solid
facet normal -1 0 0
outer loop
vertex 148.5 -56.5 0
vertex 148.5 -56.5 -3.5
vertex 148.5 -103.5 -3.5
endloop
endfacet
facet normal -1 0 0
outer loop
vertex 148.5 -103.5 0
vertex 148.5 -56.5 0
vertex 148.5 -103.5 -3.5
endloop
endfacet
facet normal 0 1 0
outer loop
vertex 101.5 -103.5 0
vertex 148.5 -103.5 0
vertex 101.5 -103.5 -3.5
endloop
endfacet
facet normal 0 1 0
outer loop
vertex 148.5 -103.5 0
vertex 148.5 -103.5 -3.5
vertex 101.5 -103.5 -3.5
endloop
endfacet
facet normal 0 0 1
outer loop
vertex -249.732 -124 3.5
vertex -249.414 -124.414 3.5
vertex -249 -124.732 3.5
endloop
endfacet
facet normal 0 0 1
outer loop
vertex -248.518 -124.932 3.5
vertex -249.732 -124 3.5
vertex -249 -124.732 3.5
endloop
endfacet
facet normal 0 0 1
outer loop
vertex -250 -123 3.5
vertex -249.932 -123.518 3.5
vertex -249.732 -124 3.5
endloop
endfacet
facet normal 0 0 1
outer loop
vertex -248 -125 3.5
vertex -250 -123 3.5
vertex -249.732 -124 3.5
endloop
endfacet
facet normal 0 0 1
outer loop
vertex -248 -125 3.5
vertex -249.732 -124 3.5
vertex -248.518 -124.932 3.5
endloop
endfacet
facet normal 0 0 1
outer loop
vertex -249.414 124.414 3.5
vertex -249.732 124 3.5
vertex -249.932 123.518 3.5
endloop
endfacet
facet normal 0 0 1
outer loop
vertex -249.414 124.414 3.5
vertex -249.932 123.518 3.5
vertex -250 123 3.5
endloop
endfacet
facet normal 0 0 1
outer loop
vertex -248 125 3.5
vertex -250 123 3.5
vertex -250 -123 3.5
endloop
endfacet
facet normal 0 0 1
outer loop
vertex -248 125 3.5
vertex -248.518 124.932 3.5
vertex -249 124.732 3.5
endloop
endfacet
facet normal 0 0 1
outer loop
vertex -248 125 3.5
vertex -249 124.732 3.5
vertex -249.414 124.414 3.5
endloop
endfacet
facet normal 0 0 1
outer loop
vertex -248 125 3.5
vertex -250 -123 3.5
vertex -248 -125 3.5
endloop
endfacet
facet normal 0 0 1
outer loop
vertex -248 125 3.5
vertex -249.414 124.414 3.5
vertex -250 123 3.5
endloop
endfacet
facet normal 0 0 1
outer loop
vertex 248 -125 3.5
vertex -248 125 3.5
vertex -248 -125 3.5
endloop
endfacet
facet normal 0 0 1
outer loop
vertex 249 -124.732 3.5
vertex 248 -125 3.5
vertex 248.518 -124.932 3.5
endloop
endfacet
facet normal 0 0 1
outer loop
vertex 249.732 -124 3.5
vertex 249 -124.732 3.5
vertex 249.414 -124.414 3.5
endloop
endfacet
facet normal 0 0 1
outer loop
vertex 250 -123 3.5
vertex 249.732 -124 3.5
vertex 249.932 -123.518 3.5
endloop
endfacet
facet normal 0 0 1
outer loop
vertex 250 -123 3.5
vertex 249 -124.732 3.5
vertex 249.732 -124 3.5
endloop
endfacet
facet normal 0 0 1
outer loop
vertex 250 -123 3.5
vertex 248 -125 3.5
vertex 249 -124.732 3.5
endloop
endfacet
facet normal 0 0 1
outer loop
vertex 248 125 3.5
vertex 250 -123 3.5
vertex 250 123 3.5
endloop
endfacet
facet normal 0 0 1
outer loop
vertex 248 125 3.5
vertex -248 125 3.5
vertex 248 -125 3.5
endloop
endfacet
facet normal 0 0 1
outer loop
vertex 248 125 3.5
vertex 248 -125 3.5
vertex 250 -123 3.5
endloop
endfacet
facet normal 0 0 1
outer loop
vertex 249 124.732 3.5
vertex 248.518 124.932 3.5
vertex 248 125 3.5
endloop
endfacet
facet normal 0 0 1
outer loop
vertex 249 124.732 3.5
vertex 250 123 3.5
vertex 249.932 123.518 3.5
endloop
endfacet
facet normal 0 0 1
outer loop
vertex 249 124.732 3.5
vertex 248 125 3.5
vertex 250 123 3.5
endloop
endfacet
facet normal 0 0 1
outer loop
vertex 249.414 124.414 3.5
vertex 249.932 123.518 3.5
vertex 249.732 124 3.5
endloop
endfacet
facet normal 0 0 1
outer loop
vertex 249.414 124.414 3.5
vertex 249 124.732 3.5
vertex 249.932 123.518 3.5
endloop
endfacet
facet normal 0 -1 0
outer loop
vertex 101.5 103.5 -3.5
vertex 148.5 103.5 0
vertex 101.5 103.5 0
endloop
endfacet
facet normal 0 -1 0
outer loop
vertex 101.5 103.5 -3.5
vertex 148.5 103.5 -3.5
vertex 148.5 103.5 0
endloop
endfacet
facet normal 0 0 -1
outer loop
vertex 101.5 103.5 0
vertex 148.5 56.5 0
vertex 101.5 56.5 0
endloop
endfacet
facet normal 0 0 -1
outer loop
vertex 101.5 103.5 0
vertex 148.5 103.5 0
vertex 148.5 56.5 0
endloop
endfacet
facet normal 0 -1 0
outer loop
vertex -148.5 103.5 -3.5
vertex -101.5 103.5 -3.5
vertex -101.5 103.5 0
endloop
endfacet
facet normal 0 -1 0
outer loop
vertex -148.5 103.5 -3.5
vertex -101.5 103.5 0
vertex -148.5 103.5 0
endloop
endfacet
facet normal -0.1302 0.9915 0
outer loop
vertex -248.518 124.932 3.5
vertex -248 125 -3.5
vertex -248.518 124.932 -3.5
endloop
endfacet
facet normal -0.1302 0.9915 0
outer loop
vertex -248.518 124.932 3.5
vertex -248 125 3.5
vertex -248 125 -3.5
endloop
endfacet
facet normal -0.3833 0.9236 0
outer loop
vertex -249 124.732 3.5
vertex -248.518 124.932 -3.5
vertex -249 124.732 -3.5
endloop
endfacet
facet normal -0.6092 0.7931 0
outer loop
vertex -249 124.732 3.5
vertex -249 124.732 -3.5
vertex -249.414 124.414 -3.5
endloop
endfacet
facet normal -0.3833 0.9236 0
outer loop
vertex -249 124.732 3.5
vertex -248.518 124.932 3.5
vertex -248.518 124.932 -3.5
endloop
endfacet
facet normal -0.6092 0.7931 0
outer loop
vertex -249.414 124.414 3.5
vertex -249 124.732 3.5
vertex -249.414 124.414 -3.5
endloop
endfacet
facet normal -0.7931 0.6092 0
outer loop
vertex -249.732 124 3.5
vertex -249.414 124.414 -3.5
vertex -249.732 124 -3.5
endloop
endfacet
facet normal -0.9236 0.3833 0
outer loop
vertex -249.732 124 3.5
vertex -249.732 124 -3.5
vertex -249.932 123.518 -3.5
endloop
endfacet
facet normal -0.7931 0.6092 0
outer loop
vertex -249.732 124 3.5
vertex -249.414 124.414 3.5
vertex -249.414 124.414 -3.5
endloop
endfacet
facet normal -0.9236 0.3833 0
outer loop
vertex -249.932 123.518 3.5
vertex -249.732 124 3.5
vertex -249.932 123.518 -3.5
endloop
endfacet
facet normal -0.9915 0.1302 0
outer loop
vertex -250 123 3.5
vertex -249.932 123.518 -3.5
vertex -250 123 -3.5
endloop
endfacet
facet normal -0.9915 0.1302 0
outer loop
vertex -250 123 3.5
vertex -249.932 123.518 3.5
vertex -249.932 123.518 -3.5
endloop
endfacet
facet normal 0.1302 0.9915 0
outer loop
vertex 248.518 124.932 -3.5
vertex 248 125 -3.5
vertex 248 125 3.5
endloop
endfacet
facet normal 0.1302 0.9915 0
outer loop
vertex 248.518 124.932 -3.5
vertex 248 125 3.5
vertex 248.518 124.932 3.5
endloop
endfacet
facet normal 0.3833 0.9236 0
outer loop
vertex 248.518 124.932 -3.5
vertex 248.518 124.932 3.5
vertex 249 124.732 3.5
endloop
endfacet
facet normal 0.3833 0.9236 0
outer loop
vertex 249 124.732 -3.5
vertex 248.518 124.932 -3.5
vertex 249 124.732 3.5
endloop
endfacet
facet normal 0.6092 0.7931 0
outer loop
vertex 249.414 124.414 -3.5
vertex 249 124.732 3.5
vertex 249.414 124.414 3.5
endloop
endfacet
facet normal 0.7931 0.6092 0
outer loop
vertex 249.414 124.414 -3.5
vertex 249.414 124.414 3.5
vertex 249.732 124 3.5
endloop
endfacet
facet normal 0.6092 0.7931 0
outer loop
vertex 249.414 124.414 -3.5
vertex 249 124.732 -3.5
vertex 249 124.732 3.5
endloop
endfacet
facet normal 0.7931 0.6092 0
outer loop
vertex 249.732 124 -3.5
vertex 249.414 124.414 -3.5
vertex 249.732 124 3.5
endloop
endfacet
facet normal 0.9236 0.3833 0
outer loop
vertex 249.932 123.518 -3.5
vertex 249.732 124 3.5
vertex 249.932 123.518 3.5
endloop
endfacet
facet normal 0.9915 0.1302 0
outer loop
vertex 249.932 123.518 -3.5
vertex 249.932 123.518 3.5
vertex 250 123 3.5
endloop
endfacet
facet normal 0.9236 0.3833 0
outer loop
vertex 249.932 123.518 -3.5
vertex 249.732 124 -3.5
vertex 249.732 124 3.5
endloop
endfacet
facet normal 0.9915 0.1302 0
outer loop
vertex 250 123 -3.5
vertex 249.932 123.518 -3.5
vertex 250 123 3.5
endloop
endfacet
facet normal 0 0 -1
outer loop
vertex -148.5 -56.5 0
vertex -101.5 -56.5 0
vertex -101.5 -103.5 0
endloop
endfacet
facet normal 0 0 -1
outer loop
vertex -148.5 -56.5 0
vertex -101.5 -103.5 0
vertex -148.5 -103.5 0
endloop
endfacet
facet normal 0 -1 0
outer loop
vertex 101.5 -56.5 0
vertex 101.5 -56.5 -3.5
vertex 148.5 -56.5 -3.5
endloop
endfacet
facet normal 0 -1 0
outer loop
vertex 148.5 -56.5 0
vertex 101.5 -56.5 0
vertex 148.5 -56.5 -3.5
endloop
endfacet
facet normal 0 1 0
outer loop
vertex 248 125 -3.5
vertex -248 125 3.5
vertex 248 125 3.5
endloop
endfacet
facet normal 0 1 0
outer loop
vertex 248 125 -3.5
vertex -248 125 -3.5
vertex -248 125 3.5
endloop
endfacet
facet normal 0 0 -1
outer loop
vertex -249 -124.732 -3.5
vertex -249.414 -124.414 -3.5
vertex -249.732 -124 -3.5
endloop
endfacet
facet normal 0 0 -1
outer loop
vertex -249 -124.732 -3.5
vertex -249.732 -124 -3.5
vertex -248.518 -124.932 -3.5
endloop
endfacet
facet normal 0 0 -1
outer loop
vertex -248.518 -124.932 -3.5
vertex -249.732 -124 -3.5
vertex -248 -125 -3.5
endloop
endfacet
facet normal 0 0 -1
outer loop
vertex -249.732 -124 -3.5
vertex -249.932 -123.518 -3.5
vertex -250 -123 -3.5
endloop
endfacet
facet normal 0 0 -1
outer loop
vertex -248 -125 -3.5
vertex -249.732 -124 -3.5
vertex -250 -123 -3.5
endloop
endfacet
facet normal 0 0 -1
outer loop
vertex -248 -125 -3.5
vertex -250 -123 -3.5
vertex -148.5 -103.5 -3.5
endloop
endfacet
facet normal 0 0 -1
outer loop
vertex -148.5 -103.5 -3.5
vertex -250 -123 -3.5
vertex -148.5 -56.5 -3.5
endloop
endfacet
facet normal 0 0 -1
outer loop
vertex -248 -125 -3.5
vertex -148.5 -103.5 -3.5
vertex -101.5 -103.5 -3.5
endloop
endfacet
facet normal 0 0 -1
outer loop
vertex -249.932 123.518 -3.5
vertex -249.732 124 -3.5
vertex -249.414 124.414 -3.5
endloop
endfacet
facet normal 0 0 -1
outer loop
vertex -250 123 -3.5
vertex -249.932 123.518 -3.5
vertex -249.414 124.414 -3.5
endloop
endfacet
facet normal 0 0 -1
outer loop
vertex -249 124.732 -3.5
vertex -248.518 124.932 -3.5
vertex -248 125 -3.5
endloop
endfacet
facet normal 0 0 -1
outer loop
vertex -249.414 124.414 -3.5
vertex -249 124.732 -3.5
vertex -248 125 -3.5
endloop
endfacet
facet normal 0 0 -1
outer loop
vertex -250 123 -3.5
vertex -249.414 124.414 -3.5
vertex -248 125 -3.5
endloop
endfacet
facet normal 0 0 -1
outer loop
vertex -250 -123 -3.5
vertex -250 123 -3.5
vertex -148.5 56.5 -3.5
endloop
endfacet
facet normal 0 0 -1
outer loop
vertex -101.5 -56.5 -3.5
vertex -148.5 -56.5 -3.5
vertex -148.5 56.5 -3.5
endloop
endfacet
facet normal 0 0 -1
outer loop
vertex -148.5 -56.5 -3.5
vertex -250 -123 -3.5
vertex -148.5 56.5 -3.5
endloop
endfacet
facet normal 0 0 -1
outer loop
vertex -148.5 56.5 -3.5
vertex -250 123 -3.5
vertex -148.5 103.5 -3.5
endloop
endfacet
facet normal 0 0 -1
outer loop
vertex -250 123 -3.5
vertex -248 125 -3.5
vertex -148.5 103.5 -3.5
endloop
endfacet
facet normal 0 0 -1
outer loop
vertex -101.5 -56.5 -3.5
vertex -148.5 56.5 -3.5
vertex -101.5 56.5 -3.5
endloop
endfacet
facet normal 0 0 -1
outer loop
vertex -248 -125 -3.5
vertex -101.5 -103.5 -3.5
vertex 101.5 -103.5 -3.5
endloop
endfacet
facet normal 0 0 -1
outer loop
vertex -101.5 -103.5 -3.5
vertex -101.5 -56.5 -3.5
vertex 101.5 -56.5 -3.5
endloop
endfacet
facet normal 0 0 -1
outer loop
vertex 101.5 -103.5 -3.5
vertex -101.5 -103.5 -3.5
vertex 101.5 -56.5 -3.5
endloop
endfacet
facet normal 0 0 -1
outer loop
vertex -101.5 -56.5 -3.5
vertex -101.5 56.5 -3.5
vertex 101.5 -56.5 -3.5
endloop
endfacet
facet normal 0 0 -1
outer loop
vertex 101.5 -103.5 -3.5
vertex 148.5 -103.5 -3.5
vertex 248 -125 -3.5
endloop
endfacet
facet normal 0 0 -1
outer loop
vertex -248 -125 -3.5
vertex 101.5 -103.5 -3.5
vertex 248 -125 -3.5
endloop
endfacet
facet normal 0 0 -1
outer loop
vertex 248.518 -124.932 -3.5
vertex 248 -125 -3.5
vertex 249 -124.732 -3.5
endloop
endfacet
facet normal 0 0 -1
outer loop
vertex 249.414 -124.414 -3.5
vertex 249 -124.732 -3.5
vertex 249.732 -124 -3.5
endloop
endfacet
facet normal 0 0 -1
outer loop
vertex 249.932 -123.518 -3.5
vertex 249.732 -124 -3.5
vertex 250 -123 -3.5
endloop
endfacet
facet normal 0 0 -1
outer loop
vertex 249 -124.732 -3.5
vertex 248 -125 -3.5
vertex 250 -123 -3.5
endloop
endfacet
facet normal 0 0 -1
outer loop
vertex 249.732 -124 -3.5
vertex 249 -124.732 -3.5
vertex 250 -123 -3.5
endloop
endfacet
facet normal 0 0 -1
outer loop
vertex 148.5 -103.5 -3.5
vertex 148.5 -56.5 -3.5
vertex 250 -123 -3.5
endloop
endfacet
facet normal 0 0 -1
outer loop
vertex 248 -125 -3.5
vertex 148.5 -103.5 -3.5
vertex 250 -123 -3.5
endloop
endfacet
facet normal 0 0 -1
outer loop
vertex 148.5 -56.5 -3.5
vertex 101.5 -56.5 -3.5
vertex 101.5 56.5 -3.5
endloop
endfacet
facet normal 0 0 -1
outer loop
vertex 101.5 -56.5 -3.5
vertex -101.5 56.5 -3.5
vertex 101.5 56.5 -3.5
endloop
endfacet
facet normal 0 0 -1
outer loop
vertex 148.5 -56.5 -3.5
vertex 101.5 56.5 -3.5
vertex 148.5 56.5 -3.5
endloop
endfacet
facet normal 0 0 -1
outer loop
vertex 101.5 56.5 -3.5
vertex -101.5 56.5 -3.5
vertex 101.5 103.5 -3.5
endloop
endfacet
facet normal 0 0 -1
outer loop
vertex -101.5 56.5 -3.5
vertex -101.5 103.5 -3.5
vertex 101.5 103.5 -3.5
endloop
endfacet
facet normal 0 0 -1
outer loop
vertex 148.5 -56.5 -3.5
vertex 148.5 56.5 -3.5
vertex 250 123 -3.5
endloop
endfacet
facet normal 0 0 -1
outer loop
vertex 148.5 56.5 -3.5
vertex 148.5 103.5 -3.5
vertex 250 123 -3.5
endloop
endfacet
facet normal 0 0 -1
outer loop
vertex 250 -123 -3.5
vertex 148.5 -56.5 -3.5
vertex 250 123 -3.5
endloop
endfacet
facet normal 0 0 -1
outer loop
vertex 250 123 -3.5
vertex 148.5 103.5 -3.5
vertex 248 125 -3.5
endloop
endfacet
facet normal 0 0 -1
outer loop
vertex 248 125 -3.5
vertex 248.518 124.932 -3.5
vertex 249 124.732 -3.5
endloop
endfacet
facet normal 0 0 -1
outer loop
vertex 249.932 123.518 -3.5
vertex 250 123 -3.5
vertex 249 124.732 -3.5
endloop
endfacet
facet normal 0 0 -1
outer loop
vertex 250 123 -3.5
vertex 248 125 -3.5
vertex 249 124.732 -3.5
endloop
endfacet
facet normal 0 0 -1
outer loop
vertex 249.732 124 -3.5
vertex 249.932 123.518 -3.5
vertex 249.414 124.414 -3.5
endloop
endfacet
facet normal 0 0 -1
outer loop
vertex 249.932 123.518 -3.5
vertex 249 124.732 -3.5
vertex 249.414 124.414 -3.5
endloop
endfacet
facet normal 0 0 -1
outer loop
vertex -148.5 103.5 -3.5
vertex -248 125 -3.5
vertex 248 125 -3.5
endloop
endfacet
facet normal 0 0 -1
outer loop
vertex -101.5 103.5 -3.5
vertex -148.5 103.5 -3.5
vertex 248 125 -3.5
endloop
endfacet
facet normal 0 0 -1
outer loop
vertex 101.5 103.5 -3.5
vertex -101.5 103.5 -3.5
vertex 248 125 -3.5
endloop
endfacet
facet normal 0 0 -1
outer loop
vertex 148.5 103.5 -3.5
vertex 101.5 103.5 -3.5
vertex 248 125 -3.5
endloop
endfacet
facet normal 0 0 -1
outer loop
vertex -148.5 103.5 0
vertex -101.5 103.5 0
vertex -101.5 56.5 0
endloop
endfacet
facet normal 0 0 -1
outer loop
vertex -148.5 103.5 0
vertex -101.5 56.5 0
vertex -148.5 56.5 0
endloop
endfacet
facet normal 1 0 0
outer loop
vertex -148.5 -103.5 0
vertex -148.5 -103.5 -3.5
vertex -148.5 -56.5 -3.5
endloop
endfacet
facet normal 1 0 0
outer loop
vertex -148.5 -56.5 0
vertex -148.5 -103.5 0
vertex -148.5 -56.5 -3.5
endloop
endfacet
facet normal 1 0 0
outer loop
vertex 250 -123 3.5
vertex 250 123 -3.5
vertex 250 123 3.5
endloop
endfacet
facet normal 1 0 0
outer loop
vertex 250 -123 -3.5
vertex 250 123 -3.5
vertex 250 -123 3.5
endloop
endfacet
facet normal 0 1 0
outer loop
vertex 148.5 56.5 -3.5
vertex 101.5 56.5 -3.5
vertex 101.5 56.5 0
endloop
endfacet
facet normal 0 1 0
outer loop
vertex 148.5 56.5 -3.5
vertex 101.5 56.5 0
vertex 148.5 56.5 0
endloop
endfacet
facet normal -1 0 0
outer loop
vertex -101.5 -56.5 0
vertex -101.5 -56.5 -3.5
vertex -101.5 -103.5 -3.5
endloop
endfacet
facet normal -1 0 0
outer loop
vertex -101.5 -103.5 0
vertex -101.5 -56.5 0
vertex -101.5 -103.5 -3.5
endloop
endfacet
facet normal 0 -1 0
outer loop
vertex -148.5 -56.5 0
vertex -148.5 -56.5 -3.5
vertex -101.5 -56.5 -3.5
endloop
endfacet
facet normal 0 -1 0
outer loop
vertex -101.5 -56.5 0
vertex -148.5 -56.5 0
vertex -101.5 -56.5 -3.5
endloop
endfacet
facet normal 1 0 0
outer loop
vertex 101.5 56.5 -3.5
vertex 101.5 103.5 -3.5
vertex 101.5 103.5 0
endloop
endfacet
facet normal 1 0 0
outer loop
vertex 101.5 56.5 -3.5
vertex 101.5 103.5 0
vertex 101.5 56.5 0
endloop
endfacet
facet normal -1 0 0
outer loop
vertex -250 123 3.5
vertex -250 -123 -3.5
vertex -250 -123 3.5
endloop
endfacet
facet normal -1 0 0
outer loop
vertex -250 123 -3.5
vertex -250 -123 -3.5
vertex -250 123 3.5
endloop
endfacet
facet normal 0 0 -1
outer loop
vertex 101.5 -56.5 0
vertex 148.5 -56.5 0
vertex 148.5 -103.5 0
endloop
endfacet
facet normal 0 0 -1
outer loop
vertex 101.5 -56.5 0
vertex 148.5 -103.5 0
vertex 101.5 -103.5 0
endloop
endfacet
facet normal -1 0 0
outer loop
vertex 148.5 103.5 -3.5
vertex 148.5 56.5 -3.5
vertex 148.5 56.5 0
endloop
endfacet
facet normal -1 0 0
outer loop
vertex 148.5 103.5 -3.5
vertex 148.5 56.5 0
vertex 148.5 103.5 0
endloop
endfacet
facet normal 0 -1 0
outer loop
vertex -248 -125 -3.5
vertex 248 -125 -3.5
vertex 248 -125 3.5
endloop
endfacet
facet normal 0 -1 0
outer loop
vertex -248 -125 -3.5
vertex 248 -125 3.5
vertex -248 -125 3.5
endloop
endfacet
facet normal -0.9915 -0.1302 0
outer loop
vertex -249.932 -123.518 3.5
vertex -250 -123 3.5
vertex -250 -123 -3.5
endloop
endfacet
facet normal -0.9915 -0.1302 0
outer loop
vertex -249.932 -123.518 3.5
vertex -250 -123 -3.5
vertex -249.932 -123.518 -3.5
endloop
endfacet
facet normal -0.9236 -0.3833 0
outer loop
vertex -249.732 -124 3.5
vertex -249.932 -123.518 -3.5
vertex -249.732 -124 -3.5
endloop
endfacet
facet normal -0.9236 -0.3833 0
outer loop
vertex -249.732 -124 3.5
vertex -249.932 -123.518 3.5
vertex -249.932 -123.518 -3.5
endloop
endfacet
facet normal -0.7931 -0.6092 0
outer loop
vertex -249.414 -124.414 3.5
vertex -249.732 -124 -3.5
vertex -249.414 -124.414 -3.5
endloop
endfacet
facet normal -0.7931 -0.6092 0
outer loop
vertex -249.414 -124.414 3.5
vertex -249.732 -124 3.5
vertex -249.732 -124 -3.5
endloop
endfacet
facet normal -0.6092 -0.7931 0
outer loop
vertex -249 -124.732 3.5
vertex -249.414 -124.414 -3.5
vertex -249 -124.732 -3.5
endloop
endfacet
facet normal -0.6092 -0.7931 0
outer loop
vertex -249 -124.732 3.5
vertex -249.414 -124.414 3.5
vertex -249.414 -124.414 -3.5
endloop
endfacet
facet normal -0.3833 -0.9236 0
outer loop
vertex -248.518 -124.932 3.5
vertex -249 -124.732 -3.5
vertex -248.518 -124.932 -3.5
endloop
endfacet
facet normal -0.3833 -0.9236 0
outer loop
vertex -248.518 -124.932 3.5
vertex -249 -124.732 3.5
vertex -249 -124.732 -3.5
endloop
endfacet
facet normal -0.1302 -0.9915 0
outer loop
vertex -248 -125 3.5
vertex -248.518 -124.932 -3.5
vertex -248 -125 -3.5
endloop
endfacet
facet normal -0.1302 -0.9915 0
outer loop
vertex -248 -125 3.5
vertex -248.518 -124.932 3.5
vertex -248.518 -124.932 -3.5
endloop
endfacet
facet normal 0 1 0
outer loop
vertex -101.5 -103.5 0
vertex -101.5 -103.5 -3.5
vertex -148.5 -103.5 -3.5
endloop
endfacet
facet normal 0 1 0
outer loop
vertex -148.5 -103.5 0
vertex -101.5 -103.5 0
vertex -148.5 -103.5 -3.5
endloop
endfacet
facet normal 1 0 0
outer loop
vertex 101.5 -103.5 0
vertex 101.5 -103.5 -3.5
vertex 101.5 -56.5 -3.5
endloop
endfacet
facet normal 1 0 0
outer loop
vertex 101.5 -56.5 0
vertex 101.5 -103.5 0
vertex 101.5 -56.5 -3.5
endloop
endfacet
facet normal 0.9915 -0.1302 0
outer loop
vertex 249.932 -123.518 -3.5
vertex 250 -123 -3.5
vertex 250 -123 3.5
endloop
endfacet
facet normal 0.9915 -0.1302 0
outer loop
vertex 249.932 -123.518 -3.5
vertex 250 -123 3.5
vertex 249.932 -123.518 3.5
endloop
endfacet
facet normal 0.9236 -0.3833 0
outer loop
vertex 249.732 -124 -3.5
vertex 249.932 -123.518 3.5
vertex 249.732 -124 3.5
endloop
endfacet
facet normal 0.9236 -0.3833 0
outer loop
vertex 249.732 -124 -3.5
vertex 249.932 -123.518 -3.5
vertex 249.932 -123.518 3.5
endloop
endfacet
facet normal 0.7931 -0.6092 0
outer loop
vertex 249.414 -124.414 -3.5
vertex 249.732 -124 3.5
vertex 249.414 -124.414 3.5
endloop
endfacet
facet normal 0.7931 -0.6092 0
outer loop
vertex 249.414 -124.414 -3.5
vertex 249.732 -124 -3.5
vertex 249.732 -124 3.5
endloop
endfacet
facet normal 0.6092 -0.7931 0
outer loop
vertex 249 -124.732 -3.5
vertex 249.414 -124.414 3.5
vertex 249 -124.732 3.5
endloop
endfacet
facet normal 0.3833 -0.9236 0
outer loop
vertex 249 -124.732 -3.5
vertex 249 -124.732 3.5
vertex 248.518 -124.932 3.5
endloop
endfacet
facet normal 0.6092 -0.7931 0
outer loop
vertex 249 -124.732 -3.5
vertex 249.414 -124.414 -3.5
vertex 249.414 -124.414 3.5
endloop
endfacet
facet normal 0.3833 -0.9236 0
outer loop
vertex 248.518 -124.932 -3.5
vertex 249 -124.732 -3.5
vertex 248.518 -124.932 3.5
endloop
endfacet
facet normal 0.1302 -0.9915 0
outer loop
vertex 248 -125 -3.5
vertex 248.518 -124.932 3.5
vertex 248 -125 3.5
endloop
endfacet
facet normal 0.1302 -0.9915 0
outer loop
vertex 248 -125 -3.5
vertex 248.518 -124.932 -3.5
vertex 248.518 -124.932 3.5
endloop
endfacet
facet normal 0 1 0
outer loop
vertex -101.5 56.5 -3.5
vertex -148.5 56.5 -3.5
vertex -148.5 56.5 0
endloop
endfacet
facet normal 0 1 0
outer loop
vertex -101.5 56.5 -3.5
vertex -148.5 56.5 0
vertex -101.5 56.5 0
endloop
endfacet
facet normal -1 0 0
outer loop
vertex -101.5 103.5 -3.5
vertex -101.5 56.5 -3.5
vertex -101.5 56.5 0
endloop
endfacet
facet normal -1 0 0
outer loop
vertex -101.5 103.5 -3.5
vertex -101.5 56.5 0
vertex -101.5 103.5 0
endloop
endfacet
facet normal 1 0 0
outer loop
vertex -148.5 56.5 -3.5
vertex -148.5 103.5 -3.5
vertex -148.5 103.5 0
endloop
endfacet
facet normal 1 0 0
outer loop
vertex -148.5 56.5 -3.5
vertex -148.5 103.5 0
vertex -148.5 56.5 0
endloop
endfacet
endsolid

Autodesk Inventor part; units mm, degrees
sketch "Sketch1" plane through (0, 0, 0) normal (0, 0, 1) x (1, 0, 0)
  line L0 (-250, 125) -> (250, 125)
  line L1 (250, 125) -> (250, -125)
  line L2 (250, -125) -> (-250, -125)
  line L3 (-250, -125) -> (-250, 125)
  line L4 (-250, 125) -> (250, -125) construction
  line L5 (250, 125) -> (-250, -125) construction
  point P0 (0, 0)
  point P1 (0, 0)
  dimension "d0" = 500
  dimension "d1" = 250
extrude "Extrusion1" add sketch "Sketch1" along normal mid plane 7
fillet "Fillet1" radius 2 4 edges at (250, 125, 0) (-250, 125, 0) (-250, -125, 0) (250, -125, 0)
sketch "Sketch2" plane through (0, 0, -3.5) normal (0, 0, -1) x (-1, 0, 0)
  line L0 (-102, -103) -> (-102, -57) projected
  line L1 (-102, -57) -> (-148, -57) projected
  line L2 (-148, -57) -> (-148, -103) projected
  line L3 (-148, -103) -> (-102, -103) projected
  line L4 (-105, -100) -> (-145, -100) projected
  line L5 (-145, -100) -> (-145, -60) projected
  line L6 (-145, -60) -> (-105, -60) projected
  line L7 (-105, -60) -> (-105, -100) projected
  line L8 (-101.5, -103.5) -> (-101.5, -56.5)
  line L9 (-101.5, -56.5) -> (-148.5, -56.5)
  line L10 (-148.5, -56.5) -> (-148.5, -103.5)
  line L11 (-148.5, -103.5) -> (-101.5, -103.5)
  line L12 (148, -103) -> (148, -57) projected
  line L13 (148, -57) -> (102, -57) projected
  line L14 (102, -57) -> (102, -103) projected
  line L15 (102, -103) -> (148, -103) projected
  line L16 (145, -100) -> (105, -100) projected
  line L17 (105, -100) -> (105, -60) projected
  line L18 (105, -60) -> (145, -60) projected
  line L19 (145, -60) -> (145, -100) projected
  line L20 (102, 103) -> (102, 57) projected
  line L21 (102, 57) -> (148, 57) projected
  line L22 (148, 57) -> (148, 103) projected
  line L23 (148, 103) -> (102, 103) projected
  line L24 (105, 100) -> (145, 100) projected
  line L25 (145, 100) -> (145, 60) projected
  line L26 (145, 60) -> (105, 60) projected
  line L27 (105, 60) -> (105, 100) projected
  line L28 (-148, 103) -> (-148, 57) projected
  line L29 (-148, 57) -> (-102, 57) projected
  line L30 (-102, 57) -> (-102, 103) projected
  line L31 (-102, 103) -> (-148, 103) projected
  line L32 (-145, 100) -> (-105, 100) projected
  line L33 (-105, 100) -> (-105, 60) projected
  line L34 (-105, 60) -> (-145, 60) projected
  line L35 (-145, 60) -> (-145, 100) projected
  line L36 (148.5, -103.5) -> (148.5, -56.5)
  line L37 (148.5, -56.5) -> (101.5, -56.5)
  line L38 (101.5, -56.5) -> (101.5, -103.5)
  line L39 (101.5, -103.5) -> (148.5, -103.5)
  line L40 (148.5, 56.5) -> (101.5, 56.5)
  line L41 (101.5, 56.5) -> (101.5, 103.5)
  line L42 (101.5, 103.5) -> (148.5, 103.5)
  line L43 (148.5, 103.5) -> (148.5, 56.5)
  line L44 (-101.5, 56.5) -> (-148.5, 56.5)
  line L45 (-148.5, 56.5) -> (-148.5, 103.5)
  line L46 (-148.5, 103.5) -> (-101.5, 103.5)
  line L47 (-101.5, 103.5) -> (-101.5, 56.5)
  point P0 (0, 0)
  dimension "d5" = 0.5
extrude "Extrusion2" cut sketch "Sketch2" against normal blind 3.5 contours L3 L2 L1 L0 | L4 L5 L6 L7 | L11 L10 L9 L8 | L15 L14 L13 L12 | L16 L17 L18 L19 | L23 L22 L21 L20 | L24 L25 L26 L27 | L31 L30 L29 L28 | L32 L33 L34 L35 | L39 L38 L37 L36 | L40 L41 L42 L43 | L44 L45 L46 L47
properties part number "sessao_07_04_002_001"
